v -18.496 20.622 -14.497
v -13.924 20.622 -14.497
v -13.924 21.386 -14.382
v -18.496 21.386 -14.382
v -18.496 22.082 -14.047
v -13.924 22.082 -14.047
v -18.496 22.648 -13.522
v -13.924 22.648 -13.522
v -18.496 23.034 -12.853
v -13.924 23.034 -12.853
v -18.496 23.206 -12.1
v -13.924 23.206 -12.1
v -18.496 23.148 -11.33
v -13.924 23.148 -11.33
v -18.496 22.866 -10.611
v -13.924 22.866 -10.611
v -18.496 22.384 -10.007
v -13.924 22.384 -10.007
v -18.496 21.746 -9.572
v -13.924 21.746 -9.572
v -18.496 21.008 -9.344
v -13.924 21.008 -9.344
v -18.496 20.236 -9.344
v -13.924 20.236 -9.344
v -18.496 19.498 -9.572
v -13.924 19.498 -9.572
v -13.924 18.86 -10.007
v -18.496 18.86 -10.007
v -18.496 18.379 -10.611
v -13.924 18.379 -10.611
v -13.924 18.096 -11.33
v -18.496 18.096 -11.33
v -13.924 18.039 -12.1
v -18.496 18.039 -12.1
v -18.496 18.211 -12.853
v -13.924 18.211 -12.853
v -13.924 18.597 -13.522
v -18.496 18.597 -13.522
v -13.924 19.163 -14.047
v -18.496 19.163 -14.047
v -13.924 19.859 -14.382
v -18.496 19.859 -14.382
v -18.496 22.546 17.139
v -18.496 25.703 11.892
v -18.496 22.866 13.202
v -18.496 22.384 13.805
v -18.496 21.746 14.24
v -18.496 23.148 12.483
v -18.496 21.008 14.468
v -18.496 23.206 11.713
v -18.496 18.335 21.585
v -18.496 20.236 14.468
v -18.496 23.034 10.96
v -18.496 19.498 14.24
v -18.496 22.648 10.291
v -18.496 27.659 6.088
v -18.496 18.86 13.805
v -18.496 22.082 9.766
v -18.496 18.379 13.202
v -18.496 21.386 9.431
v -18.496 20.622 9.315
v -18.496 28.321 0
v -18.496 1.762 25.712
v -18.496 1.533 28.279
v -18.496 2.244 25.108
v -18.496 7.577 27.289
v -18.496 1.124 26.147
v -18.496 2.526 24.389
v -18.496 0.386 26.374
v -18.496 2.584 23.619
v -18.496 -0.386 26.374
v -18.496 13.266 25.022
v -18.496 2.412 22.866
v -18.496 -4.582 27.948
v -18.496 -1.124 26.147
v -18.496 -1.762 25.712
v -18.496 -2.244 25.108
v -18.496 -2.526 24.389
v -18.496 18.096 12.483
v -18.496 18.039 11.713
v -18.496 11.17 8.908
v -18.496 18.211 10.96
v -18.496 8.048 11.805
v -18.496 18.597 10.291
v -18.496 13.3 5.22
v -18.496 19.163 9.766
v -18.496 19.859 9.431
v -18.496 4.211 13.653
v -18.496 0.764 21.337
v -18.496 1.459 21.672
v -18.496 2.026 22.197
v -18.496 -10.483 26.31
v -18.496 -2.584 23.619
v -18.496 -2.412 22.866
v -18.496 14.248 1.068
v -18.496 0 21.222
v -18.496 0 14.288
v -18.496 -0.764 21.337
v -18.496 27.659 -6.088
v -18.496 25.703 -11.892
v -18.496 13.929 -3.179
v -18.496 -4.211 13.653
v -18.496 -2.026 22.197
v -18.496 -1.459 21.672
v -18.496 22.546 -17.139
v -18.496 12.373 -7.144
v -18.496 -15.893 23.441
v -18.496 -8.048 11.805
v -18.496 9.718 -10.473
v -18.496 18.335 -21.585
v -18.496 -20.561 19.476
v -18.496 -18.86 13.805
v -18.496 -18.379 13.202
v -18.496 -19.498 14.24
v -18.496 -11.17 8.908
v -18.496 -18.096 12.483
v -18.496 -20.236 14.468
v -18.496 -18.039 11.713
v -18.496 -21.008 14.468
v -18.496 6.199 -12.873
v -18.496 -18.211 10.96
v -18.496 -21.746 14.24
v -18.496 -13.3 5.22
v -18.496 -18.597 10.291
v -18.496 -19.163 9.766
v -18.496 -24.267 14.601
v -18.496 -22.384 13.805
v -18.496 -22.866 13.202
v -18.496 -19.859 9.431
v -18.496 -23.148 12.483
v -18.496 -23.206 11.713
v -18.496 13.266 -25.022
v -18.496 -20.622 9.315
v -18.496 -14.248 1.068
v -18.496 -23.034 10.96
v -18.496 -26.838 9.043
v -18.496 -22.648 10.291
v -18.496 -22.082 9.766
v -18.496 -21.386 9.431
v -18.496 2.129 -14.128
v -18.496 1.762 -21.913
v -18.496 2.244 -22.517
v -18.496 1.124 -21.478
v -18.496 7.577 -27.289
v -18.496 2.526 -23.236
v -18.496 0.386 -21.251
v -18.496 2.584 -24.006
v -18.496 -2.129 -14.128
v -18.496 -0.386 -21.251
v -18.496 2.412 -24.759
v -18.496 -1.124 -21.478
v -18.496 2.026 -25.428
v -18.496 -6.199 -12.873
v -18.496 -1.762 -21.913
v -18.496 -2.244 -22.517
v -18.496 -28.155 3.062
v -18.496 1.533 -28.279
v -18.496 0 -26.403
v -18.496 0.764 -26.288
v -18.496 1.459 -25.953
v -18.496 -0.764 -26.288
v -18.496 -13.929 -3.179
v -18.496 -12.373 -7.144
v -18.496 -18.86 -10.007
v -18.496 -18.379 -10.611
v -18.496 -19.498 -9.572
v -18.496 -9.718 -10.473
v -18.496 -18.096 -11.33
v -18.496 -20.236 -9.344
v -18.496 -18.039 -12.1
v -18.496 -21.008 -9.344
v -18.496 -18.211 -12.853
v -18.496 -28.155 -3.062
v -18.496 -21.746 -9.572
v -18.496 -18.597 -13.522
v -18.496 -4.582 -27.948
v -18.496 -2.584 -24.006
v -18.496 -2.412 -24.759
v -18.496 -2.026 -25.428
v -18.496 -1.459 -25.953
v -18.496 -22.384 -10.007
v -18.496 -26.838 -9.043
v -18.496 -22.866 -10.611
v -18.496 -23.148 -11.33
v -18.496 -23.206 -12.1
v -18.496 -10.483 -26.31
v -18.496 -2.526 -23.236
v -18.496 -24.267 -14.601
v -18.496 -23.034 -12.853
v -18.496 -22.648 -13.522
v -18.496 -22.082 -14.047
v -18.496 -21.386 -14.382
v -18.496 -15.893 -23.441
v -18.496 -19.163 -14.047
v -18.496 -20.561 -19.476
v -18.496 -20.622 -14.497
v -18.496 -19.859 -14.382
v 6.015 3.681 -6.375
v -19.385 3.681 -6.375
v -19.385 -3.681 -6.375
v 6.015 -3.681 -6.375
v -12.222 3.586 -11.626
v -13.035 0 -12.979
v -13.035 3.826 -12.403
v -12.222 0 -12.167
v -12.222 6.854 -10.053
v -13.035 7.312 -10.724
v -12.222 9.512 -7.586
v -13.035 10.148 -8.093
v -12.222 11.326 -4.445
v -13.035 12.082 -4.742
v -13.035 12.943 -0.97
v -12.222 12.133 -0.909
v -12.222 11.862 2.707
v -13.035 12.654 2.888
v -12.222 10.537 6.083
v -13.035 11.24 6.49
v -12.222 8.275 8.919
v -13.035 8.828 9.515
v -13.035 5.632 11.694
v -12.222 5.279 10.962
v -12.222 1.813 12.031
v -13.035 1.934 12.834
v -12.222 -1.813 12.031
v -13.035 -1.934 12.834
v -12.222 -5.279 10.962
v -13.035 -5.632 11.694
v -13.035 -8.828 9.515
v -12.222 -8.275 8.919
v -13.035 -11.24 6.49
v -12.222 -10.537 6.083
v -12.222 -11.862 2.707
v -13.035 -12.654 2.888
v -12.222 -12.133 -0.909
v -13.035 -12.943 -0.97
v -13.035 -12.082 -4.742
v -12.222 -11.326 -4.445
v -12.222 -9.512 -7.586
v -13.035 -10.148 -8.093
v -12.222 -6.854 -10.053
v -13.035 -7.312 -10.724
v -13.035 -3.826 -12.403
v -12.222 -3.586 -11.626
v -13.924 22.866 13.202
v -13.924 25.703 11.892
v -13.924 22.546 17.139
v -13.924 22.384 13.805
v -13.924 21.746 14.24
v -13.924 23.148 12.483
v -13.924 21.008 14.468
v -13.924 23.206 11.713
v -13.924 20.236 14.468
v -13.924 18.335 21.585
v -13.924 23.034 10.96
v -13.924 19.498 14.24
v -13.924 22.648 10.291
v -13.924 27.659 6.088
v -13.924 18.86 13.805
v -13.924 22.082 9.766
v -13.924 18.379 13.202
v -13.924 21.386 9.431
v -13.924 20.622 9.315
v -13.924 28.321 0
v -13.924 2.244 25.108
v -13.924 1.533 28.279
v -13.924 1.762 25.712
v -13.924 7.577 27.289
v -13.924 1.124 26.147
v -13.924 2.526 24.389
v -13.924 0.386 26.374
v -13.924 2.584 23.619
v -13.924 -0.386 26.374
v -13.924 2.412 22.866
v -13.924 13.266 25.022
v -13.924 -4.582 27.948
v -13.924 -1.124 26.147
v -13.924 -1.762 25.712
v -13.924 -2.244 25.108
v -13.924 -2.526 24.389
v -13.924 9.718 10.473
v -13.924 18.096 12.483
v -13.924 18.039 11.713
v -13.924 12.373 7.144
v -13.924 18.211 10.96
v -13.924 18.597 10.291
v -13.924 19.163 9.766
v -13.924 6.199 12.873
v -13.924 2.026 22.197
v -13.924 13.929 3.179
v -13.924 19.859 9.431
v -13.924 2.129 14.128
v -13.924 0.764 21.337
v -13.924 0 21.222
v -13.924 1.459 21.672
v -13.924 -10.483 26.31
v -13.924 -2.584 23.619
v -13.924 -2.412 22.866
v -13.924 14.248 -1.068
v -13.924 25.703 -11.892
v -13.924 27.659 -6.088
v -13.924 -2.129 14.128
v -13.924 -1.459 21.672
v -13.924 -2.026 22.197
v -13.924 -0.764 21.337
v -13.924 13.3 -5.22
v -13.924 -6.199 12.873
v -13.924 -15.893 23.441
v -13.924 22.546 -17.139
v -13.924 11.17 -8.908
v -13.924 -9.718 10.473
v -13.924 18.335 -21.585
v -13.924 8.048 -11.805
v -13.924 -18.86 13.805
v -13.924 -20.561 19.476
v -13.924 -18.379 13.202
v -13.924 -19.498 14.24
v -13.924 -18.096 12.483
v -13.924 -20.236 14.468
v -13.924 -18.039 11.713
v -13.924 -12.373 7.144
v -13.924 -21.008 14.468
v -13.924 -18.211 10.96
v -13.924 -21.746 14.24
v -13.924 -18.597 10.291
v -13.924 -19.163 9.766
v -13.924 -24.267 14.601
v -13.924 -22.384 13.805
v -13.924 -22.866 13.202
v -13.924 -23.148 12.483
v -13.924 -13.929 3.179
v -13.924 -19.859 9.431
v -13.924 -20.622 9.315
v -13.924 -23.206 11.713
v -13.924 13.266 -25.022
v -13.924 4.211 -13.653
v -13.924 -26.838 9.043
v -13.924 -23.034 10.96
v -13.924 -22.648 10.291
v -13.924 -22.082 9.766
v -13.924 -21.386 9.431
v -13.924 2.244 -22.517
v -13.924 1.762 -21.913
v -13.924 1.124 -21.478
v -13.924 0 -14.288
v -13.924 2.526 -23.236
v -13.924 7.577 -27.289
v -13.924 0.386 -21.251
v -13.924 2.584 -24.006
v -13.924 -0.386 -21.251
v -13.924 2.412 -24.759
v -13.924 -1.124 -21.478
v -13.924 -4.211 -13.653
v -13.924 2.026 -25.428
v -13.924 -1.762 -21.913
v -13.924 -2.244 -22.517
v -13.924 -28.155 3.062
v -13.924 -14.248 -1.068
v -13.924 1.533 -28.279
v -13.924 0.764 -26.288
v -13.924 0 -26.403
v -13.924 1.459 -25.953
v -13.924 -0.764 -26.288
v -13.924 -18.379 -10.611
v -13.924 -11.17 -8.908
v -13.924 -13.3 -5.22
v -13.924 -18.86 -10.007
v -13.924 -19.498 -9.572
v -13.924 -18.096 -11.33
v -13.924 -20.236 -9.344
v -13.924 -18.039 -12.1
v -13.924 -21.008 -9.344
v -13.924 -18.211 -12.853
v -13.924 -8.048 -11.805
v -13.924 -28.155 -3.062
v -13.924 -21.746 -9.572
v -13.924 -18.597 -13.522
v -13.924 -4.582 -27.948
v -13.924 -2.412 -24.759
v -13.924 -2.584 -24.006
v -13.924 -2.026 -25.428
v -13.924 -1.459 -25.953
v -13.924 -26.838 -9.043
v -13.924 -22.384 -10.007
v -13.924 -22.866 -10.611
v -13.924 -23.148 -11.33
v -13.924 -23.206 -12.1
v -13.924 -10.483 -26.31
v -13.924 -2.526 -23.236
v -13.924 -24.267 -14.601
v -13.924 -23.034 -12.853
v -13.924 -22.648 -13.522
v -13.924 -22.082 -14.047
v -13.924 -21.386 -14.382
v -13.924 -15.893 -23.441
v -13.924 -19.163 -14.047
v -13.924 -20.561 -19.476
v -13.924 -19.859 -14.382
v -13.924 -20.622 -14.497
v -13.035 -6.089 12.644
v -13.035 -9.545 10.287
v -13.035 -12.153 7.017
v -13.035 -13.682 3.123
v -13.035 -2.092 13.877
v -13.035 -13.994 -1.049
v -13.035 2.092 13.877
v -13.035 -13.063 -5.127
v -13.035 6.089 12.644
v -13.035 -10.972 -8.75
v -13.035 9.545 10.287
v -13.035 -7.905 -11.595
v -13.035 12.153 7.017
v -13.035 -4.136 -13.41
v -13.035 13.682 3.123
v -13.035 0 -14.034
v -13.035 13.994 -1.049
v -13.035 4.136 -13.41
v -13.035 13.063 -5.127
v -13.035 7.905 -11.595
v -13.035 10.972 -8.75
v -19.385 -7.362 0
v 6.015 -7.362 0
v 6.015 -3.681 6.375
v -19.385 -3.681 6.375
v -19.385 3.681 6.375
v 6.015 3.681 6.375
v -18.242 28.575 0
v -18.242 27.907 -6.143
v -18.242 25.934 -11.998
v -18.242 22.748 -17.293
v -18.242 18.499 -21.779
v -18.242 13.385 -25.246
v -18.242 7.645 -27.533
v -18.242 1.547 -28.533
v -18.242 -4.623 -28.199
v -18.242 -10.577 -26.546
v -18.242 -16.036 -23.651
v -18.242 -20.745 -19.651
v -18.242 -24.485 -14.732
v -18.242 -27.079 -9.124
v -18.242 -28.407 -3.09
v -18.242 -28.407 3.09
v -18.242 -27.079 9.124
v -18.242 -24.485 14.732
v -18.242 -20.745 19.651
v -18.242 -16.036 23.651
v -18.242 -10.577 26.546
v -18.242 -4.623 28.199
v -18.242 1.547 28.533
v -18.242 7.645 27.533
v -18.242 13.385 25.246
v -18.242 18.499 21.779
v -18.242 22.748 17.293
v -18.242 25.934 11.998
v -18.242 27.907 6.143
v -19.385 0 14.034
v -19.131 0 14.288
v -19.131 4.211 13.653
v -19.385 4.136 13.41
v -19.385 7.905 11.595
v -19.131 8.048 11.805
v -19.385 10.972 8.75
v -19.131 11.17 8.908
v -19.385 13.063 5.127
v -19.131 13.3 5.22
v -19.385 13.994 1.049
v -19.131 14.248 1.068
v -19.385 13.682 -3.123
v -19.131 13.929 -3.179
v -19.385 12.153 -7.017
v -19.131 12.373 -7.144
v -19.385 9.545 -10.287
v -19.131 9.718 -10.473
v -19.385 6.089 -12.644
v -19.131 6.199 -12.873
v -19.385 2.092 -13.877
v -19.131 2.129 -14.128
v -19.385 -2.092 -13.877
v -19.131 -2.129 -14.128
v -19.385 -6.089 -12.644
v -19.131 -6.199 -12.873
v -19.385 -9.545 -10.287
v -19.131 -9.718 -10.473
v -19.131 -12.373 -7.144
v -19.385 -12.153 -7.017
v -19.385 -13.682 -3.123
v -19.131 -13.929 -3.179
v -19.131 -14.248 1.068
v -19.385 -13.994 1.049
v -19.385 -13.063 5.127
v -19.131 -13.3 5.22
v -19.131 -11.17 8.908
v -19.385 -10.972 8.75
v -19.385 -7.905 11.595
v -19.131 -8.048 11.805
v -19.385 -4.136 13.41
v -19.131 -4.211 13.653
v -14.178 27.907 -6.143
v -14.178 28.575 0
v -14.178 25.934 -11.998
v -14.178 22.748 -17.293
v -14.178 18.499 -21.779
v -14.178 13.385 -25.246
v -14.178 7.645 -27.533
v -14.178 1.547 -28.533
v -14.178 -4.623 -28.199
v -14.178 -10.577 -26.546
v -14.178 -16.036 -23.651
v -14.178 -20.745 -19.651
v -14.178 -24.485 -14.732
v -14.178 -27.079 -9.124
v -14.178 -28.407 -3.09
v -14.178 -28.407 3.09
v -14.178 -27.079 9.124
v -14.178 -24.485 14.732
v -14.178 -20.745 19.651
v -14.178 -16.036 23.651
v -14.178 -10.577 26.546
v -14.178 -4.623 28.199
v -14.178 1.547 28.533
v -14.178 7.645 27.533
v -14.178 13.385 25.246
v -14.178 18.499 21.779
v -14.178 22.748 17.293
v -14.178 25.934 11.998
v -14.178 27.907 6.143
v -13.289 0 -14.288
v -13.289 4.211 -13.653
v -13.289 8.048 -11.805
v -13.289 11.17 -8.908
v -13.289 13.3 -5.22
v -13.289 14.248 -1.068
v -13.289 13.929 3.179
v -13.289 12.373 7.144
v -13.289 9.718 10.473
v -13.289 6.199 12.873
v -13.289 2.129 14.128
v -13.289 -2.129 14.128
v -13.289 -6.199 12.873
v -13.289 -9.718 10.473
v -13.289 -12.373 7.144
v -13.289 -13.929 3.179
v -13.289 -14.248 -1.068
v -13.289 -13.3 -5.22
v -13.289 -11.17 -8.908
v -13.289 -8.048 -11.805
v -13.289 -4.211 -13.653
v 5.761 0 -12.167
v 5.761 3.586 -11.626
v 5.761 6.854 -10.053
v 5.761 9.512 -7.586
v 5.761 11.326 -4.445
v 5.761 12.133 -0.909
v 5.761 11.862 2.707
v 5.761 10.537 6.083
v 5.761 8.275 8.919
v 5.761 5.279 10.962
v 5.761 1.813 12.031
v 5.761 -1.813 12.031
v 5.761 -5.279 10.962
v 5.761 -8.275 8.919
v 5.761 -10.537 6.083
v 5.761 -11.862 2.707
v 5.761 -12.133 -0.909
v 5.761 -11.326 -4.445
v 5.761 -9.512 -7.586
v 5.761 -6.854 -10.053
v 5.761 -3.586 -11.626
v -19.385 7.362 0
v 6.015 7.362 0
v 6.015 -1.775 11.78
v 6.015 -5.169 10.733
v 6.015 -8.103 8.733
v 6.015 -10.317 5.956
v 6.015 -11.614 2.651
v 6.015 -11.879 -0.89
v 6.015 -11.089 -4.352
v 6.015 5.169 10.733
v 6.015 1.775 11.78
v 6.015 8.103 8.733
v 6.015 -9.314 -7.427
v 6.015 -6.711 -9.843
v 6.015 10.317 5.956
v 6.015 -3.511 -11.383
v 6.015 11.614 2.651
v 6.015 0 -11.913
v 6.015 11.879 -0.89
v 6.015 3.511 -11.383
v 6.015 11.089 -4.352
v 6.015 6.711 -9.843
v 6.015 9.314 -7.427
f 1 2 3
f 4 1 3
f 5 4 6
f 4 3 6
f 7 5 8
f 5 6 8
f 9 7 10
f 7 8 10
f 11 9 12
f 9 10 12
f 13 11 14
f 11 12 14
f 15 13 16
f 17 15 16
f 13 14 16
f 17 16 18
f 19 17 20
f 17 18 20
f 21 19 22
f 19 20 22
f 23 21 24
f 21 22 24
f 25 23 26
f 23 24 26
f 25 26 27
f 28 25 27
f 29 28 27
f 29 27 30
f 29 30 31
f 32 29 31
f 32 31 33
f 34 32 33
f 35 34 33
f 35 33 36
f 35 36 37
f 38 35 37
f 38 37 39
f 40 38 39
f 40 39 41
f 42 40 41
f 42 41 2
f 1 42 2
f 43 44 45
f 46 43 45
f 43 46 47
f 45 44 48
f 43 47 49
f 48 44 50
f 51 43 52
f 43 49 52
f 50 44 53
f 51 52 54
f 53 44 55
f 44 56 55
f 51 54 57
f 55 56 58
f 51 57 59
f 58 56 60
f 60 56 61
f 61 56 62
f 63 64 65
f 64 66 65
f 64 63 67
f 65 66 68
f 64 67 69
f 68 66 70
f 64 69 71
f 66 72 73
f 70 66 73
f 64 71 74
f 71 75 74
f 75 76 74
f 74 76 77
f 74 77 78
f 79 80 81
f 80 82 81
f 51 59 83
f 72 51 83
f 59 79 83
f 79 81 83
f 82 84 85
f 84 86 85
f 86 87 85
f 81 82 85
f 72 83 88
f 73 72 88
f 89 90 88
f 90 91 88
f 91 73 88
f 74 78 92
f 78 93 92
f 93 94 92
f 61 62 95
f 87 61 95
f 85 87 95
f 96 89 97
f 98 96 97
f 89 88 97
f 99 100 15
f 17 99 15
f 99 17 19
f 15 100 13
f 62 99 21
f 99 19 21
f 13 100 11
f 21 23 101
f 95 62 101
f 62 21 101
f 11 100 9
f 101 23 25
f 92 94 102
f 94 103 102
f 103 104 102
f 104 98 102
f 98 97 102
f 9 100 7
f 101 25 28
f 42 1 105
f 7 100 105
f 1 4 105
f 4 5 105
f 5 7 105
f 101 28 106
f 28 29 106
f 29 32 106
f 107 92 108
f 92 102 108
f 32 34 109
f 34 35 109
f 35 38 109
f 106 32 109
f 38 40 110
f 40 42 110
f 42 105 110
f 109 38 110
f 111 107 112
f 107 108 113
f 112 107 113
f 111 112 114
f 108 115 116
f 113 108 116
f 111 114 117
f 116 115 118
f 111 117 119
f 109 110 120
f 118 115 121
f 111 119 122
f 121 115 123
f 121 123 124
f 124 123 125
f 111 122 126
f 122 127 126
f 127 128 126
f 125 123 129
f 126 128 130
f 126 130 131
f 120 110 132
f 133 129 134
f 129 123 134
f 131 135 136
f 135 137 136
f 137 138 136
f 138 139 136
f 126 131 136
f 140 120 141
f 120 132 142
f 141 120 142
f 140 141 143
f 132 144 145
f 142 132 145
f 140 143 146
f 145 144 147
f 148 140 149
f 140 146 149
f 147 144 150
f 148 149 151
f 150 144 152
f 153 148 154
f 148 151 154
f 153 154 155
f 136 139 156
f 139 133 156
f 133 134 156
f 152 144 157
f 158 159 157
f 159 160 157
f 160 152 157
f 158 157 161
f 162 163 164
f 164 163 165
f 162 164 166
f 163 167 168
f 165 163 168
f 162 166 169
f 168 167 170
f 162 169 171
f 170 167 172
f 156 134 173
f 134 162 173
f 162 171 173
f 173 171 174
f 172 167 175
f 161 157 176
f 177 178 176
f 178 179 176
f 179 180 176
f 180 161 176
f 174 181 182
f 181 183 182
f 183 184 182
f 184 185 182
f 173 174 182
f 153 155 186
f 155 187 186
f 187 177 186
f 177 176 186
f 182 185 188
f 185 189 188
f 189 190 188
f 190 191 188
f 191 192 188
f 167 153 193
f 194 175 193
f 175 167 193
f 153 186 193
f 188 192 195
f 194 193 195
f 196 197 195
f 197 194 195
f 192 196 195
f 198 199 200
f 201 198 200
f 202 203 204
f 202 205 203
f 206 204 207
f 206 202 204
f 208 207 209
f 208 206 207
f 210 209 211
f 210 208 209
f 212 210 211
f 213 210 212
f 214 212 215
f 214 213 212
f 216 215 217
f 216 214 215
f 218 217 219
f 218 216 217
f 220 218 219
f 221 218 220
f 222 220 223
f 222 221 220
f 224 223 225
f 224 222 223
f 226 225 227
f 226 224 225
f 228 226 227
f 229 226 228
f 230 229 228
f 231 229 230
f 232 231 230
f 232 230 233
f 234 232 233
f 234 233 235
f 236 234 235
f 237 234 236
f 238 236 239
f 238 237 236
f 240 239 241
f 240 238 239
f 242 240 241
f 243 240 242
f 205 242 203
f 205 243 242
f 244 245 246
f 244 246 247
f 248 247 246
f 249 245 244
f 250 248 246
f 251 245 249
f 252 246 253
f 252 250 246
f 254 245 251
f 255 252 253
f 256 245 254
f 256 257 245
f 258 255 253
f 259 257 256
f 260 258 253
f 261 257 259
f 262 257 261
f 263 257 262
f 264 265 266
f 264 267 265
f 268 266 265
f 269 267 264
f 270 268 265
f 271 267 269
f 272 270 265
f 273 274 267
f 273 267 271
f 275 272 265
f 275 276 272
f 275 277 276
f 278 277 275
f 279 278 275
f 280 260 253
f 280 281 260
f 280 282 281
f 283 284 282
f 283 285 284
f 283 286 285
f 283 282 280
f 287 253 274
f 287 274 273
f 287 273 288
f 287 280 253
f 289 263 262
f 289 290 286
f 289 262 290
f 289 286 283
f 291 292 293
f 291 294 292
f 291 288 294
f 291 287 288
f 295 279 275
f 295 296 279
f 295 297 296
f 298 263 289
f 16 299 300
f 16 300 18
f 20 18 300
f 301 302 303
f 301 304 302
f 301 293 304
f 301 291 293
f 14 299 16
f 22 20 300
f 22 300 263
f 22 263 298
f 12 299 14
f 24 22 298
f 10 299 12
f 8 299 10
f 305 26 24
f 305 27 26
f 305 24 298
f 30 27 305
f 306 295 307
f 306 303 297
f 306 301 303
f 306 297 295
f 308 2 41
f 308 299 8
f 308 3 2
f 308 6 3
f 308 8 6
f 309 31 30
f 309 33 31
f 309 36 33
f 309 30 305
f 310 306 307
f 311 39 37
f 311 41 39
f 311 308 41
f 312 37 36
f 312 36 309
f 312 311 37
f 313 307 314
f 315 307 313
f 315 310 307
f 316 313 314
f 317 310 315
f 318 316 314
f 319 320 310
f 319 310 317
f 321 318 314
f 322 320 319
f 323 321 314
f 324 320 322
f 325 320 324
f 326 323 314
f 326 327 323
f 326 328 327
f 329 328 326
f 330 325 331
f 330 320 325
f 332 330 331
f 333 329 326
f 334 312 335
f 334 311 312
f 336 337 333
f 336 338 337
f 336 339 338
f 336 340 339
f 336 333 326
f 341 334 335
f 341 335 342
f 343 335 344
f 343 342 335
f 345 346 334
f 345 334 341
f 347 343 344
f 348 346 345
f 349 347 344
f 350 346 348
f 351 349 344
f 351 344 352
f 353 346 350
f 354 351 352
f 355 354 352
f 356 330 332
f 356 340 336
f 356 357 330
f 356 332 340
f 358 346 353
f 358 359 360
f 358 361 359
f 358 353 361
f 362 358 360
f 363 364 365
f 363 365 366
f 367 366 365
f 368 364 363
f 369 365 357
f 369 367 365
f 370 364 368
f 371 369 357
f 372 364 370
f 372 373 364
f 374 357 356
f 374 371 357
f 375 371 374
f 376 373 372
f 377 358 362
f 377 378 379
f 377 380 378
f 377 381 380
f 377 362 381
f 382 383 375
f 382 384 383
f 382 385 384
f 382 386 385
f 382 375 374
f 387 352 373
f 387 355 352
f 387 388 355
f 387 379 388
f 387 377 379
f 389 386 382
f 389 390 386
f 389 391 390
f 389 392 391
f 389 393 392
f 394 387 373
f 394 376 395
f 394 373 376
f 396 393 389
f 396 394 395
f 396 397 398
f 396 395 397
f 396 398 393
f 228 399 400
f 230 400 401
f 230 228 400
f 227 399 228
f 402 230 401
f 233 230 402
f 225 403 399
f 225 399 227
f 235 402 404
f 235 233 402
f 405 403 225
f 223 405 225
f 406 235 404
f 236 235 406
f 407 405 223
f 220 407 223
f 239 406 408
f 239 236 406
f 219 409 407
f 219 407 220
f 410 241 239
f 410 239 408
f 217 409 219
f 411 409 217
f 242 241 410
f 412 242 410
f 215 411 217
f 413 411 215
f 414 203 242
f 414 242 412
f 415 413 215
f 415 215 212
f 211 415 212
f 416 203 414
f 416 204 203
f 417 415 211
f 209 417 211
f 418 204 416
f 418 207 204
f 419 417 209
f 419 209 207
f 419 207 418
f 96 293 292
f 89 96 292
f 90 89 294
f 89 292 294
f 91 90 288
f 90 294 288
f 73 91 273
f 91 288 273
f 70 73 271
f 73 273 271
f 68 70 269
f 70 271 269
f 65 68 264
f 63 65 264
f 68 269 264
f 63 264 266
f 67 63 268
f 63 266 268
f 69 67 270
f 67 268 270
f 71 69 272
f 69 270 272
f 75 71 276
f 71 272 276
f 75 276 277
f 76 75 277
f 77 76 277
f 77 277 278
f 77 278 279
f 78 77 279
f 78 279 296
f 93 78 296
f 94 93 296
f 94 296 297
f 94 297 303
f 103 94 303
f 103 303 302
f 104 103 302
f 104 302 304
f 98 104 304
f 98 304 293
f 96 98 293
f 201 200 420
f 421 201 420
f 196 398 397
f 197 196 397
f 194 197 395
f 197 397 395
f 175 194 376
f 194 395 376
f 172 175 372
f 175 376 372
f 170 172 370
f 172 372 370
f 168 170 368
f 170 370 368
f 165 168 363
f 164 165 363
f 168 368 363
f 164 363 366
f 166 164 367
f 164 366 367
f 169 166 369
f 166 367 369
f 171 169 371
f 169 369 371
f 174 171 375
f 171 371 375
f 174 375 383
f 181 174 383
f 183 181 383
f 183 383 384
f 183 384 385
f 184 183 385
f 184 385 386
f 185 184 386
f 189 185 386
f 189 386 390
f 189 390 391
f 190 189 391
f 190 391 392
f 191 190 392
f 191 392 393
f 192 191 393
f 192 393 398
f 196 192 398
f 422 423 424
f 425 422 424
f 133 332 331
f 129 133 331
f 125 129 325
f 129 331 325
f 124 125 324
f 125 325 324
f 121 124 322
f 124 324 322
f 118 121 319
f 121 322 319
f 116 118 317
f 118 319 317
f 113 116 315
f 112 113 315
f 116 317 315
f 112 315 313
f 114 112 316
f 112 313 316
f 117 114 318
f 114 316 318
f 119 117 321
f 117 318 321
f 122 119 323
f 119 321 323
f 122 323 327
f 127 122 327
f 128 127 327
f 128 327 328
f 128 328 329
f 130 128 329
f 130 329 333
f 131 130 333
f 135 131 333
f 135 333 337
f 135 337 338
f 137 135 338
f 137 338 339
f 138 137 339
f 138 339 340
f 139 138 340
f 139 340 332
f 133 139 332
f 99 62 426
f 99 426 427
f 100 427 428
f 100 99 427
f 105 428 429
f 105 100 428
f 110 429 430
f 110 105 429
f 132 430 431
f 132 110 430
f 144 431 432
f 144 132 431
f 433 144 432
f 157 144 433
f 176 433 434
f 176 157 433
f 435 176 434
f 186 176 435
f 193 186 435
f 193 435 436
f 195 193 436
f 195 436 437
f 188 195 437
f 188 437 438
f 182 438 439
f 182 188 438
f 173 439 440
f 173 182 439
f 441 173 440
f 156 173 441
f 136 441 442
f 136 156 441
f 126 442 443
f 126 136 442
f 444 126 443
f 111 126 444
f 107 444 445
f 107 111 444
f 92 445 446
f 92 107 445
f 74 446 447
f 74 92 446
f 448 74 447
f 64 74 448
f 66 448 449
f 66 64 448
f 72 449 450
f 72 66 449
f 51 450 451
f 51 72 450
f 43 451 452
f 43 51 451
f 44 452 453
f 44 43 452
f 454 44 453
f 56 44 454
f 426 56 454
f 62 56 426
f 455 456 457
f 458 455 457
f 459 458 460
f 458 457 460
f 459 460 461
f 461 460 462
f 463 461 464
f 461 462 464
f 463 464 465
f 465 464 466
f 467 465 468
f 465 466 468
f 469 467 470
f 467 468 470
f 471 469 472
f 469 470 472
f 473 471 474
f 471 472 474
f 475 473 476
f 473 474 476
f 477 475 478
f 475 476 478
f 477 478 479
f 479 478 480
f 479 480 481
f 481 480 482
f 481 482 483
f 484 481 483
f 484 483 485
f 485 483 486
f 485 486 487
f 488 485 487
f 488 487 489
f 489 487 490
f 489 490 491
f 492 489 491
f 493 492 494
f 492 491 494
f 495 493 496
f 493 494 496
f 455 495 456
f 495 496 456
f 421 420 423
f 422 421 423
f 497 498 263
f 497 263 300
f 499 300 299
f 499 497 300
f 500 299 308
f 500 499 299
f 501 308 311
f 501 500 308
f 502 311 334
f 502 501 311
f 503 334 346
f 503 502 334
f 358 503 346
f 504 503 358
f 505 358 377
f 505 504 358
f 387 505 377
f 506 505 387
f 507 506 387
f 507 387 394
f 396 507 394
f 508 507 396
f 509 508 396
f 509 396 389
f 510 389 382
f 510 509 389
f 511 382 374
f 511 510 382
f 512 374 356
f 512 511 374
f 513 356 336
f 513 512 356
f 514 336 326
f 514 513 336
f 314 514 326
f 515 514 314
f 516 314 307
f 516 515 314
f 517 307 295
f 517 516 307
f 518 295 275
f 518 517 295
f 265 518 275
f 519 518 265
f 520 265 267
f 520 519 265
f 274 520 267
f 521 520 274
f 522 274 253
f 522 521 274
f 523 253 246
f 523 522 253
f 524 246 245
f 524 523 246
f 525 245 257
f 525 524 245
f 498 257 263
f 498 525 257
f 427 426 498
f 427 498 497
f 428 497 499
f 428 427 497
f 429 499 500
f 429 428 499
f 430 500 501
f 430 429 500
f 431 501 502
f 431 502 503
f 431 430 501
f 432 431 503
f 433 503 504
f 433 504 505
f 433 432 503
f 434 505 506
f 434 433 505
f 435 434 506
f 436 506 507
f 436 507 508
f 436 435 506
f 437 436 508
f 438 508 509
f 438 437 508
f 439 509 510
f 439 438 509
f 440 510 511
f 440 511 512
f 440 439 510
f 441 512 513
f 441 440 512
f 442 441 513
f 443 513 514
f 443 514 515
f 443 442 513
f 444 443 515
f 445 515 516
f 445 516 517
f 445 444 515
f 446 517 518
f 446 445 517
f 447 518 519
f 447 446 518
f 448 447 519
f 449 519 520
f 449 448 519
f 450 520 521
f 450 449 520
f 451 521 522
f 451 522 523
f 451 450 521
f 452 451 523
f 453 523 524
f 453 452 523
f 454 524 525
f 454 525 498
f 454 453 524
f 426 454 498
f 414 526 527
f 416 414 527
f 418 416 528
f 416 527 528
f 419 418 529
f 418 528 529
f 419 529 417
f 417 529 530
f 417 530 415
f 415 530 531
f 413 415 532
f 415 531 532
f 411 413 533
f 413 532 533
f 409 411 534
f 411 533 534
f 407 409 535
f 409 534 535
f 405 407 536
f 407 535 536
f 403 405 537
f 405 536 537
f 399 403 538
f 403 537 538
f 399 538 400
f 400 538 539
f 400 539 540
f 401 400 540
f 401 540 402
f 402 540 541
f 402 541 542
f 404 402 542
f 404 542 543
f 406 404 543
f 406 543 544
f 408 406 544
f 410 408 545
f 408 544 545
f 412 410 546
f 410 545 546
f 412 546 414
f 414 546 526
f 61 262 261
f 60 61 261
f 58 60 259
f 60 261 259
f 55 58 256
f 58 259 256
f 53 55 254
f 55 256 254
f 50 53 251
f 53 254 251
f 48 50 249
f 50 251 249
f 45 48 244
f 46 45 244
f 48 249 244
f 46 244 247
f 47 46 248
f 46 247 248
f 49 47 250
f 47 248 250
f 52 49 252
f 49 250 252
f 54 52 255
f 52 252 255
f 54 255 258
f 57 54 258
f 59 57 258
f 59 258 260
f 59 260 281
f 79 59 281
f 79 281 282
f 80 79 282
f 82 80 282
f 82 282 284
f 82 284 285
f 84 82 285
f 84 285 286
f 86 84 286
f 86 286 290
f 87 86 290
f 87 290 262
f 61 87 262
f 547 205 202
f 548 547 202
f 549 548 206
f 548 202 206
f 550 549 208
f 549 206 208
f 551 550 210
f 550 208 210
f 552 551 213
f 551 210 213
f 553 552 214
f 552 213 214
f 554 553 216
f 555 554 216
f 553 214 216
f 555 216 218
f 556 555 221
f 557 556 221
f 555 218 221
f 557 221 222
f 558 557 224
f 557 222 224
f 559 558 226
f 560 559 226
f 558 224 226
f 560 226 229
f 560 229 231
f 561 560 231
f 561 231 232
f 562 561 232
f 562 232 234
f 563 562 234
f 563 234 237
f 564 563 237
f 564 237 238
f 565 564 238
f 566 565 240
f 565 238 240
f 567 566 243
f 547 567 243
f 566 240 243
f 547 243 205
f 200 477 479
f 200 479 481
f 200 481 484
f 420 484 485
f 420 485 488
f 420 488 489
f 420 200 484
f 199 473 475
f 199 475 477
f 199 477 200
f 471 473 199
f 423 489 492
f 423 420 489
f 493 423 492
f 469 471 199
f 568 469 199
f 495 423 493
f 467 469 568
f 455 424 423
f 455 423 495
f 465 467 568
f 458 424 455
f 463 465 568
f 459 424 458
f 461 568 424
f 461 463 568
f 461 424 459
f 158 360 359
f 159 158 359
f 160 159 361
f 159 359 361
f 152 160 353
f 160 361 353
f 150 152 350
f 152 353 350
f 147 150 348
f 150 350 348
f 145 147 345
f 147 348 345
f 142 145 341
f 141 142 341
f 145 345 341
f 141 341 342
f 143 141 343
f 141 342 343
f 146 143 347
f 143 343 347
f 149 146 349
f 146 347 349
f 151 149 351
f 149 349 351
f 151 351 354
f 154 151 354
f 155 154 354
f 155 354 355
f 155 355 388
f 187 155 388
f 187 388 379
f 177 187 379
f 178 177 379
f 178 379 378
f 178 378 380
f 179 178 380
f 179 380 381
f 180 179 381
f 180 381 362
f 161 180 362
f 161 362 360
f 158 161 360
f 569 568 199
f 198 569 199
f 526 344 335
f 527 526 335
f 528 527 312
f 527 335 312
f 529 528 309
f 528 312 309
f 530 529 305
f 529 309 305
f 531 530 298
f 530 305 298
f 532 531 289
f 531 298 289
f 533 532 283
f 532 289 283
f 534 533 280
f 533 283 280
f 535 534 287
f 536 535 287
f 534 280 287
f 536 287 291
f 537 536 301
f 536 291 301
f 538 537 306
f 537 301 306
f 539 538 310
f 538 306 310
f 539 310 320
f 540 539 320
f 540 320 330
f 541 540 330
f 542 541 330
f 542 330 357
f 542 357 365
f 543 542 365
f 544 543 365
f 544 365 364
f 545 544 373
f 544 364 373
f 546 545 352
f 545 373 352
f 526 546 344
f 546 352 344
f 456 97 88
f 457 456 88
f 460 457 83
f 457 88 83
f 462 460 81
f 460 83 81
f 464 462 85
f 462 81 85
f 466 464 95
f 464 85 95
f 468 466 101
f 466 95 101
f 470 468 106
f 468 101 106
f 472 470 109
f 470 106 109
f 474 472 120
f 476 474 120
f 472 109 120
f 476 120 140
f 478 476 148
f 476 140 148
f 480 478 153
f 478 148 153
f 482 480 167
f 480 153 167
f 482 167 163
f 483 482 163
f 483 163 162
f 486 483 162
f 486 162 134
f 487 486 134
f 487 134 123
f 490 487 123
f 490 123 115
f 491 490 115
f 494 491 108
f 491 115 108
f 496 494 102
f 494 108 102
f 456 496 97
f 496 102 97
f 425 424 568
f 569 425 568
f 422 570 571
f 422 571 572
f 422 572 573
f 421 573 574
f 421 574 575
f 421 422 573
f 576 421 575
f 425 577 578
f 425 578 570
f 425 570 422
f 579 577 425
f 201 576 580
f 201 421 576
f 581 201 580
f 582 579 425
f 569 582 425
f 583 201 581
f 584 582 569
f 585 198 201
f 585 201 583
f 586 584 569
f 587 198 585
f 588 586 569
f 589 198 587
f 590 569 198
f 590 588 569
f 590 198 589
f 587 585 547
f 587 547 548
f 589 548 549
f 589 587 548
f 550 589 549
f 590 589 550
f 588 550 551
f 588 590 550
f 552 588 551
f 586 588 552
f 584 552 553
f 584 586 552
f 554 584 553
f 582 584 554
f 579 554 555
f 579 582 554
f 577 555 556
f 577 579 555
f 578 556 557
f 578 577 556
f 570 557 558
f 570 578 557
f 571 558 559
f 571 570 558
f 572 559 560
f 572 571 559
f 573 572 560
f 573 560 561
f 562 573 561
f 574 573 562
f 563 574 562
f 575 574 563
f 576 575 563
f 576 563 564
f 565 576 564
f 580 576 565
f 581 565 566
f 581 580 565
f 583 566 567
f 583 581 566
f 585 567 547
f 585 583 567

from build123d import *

# Parameters (mm, degrees)
SKETCH1_W                      = 4.572
SKETCH1_H                      = 28.575
SKETCH2_R                      = 14.2875
BOSS_EXTRUDE1_DEPTH            = 0.889
SKETCH3_R                      = 12.9794
BOSS_EXTRUDE2_DEPTH            = 0.8128
BOSS_EXTRUDE2_TAPER            = 45
SKETCH4_R                      = 12.1666
BOSS_EXTRUDE3_DEPTH            = 18.2372
SKETCH5_R                      = 14.2875
BOSS_EXTRUDE4_DEPTH            = 0.889
CUT_EXTRUDE1_DEPTH             = 26.4
F_6_0_204_DIAMETER_HOLE1_D     = 5.1816
F_6_0_204_DIAMETER_HOLE1_DEPTH = 24.511
CHAMFER1_SIZE                  = 0.254


with BuildPart() as part:
    # Sketch1 → Revolve1 (revolve)
    with BuildSketch(Plane(origin=(0, 0, 0), x_dir=(-1, 0, 0), z_dir=(0, 0, -1))):
        with Locations((16.210066246, 14.2875)):
            Rectangle(SKETCH1_W, SKETCH1_H)
    revolve(axis=Axis((-13.924066246, 0, 0), (-1, 0, 0)))

    # Sketch2 → Boss-Extrude1 (add)
    with BuildSketch(Plane(origin=(-13.924066246, 0, 0), x_dir=(0, 0, -1), z_dir=(1, 0, 0))):
        Circle(SKETCH2_R)
    extrude(amount=BOSS_EXTRUDE1_DEPTH)

    # Sketch3 → Boss-Extrude2 (add)
    with BuildSketch(Plane(origin=(-13.035066246, 0, 0), x_dir=(0, 0, -1), z_dir=(1, 0, 0))):
        Circle(SKETCH3_R)
    extrude(amount=BOSS_EXTRUDE2_DEPTH, taper=BOSS_EXTRUDE2_TAPER)

    # Sketch4 → Boss-Extrude3 (add)
    with BuildSketch(Plane(origin=(-12.222266246, 0, 0), x_dir=(0, 0, -1), z_dir=(1, 0, 0))):
        Circle(SKETCH4_R)
    extrude(amount=BOSS_EXTRUDE3_DEPTH)

    # Sketch5 → Boss-Extrude4 (add)
    with BuildSketch(Plane.ZY.offset(18.496066246)):
        Circle(SKETCH5_R)
    extrude(amount=BOSS_EXTRUDE4_DEPTH)

    # Sketch6 → Cut-Extrude1 (cut, through all)
    with BuildSketch(Plane.ZY.offset(19.385066246)):
        Polygon((0, 7.361657812), (-6.3754, 3.680818906), (-6.3754, -3.680858906), (0, -7.361697812), (6.3754, -3.680858906), (6.3754, 3.680818906), align=None)
    extrude(amount=-CUT_EXTRUDE1_DEPTH, mode=Mode.SUBTRACT)

    # #6 (0.204) Diameter Hole1
    with Locations(Plane.ZY.offset(18.496066246)):
        with Locations((11.90625, 20.622229928), (-23.8125, 0), (11.90625, -20.622229928), (-11.90625, -20.622229928), (-11.90625, 20.622229928), (23.8125, 0)):
            Hole(F_6_0_204_DIAMETER_HOLE1_D / 2, depth=F_6_0_204_DIAMETER_HOLE1_DEPTH)

    # Chamfer1
    chamfer1_edges = [part.edges().sort_by_distance(p)[0] for p in [
        (6.014933754, 0, 12.1666),
        (-19.385066246, 0, -14.2875),
        (-18.496066246, -28.575, 0),
        (-13.924066246, -28.575, 0),
        (-13.035066246, 0, 14.2875),
    ]]
    chamfer(chamfer1_edges, length=CHAMFER1_SIZE)


solid = part.part
